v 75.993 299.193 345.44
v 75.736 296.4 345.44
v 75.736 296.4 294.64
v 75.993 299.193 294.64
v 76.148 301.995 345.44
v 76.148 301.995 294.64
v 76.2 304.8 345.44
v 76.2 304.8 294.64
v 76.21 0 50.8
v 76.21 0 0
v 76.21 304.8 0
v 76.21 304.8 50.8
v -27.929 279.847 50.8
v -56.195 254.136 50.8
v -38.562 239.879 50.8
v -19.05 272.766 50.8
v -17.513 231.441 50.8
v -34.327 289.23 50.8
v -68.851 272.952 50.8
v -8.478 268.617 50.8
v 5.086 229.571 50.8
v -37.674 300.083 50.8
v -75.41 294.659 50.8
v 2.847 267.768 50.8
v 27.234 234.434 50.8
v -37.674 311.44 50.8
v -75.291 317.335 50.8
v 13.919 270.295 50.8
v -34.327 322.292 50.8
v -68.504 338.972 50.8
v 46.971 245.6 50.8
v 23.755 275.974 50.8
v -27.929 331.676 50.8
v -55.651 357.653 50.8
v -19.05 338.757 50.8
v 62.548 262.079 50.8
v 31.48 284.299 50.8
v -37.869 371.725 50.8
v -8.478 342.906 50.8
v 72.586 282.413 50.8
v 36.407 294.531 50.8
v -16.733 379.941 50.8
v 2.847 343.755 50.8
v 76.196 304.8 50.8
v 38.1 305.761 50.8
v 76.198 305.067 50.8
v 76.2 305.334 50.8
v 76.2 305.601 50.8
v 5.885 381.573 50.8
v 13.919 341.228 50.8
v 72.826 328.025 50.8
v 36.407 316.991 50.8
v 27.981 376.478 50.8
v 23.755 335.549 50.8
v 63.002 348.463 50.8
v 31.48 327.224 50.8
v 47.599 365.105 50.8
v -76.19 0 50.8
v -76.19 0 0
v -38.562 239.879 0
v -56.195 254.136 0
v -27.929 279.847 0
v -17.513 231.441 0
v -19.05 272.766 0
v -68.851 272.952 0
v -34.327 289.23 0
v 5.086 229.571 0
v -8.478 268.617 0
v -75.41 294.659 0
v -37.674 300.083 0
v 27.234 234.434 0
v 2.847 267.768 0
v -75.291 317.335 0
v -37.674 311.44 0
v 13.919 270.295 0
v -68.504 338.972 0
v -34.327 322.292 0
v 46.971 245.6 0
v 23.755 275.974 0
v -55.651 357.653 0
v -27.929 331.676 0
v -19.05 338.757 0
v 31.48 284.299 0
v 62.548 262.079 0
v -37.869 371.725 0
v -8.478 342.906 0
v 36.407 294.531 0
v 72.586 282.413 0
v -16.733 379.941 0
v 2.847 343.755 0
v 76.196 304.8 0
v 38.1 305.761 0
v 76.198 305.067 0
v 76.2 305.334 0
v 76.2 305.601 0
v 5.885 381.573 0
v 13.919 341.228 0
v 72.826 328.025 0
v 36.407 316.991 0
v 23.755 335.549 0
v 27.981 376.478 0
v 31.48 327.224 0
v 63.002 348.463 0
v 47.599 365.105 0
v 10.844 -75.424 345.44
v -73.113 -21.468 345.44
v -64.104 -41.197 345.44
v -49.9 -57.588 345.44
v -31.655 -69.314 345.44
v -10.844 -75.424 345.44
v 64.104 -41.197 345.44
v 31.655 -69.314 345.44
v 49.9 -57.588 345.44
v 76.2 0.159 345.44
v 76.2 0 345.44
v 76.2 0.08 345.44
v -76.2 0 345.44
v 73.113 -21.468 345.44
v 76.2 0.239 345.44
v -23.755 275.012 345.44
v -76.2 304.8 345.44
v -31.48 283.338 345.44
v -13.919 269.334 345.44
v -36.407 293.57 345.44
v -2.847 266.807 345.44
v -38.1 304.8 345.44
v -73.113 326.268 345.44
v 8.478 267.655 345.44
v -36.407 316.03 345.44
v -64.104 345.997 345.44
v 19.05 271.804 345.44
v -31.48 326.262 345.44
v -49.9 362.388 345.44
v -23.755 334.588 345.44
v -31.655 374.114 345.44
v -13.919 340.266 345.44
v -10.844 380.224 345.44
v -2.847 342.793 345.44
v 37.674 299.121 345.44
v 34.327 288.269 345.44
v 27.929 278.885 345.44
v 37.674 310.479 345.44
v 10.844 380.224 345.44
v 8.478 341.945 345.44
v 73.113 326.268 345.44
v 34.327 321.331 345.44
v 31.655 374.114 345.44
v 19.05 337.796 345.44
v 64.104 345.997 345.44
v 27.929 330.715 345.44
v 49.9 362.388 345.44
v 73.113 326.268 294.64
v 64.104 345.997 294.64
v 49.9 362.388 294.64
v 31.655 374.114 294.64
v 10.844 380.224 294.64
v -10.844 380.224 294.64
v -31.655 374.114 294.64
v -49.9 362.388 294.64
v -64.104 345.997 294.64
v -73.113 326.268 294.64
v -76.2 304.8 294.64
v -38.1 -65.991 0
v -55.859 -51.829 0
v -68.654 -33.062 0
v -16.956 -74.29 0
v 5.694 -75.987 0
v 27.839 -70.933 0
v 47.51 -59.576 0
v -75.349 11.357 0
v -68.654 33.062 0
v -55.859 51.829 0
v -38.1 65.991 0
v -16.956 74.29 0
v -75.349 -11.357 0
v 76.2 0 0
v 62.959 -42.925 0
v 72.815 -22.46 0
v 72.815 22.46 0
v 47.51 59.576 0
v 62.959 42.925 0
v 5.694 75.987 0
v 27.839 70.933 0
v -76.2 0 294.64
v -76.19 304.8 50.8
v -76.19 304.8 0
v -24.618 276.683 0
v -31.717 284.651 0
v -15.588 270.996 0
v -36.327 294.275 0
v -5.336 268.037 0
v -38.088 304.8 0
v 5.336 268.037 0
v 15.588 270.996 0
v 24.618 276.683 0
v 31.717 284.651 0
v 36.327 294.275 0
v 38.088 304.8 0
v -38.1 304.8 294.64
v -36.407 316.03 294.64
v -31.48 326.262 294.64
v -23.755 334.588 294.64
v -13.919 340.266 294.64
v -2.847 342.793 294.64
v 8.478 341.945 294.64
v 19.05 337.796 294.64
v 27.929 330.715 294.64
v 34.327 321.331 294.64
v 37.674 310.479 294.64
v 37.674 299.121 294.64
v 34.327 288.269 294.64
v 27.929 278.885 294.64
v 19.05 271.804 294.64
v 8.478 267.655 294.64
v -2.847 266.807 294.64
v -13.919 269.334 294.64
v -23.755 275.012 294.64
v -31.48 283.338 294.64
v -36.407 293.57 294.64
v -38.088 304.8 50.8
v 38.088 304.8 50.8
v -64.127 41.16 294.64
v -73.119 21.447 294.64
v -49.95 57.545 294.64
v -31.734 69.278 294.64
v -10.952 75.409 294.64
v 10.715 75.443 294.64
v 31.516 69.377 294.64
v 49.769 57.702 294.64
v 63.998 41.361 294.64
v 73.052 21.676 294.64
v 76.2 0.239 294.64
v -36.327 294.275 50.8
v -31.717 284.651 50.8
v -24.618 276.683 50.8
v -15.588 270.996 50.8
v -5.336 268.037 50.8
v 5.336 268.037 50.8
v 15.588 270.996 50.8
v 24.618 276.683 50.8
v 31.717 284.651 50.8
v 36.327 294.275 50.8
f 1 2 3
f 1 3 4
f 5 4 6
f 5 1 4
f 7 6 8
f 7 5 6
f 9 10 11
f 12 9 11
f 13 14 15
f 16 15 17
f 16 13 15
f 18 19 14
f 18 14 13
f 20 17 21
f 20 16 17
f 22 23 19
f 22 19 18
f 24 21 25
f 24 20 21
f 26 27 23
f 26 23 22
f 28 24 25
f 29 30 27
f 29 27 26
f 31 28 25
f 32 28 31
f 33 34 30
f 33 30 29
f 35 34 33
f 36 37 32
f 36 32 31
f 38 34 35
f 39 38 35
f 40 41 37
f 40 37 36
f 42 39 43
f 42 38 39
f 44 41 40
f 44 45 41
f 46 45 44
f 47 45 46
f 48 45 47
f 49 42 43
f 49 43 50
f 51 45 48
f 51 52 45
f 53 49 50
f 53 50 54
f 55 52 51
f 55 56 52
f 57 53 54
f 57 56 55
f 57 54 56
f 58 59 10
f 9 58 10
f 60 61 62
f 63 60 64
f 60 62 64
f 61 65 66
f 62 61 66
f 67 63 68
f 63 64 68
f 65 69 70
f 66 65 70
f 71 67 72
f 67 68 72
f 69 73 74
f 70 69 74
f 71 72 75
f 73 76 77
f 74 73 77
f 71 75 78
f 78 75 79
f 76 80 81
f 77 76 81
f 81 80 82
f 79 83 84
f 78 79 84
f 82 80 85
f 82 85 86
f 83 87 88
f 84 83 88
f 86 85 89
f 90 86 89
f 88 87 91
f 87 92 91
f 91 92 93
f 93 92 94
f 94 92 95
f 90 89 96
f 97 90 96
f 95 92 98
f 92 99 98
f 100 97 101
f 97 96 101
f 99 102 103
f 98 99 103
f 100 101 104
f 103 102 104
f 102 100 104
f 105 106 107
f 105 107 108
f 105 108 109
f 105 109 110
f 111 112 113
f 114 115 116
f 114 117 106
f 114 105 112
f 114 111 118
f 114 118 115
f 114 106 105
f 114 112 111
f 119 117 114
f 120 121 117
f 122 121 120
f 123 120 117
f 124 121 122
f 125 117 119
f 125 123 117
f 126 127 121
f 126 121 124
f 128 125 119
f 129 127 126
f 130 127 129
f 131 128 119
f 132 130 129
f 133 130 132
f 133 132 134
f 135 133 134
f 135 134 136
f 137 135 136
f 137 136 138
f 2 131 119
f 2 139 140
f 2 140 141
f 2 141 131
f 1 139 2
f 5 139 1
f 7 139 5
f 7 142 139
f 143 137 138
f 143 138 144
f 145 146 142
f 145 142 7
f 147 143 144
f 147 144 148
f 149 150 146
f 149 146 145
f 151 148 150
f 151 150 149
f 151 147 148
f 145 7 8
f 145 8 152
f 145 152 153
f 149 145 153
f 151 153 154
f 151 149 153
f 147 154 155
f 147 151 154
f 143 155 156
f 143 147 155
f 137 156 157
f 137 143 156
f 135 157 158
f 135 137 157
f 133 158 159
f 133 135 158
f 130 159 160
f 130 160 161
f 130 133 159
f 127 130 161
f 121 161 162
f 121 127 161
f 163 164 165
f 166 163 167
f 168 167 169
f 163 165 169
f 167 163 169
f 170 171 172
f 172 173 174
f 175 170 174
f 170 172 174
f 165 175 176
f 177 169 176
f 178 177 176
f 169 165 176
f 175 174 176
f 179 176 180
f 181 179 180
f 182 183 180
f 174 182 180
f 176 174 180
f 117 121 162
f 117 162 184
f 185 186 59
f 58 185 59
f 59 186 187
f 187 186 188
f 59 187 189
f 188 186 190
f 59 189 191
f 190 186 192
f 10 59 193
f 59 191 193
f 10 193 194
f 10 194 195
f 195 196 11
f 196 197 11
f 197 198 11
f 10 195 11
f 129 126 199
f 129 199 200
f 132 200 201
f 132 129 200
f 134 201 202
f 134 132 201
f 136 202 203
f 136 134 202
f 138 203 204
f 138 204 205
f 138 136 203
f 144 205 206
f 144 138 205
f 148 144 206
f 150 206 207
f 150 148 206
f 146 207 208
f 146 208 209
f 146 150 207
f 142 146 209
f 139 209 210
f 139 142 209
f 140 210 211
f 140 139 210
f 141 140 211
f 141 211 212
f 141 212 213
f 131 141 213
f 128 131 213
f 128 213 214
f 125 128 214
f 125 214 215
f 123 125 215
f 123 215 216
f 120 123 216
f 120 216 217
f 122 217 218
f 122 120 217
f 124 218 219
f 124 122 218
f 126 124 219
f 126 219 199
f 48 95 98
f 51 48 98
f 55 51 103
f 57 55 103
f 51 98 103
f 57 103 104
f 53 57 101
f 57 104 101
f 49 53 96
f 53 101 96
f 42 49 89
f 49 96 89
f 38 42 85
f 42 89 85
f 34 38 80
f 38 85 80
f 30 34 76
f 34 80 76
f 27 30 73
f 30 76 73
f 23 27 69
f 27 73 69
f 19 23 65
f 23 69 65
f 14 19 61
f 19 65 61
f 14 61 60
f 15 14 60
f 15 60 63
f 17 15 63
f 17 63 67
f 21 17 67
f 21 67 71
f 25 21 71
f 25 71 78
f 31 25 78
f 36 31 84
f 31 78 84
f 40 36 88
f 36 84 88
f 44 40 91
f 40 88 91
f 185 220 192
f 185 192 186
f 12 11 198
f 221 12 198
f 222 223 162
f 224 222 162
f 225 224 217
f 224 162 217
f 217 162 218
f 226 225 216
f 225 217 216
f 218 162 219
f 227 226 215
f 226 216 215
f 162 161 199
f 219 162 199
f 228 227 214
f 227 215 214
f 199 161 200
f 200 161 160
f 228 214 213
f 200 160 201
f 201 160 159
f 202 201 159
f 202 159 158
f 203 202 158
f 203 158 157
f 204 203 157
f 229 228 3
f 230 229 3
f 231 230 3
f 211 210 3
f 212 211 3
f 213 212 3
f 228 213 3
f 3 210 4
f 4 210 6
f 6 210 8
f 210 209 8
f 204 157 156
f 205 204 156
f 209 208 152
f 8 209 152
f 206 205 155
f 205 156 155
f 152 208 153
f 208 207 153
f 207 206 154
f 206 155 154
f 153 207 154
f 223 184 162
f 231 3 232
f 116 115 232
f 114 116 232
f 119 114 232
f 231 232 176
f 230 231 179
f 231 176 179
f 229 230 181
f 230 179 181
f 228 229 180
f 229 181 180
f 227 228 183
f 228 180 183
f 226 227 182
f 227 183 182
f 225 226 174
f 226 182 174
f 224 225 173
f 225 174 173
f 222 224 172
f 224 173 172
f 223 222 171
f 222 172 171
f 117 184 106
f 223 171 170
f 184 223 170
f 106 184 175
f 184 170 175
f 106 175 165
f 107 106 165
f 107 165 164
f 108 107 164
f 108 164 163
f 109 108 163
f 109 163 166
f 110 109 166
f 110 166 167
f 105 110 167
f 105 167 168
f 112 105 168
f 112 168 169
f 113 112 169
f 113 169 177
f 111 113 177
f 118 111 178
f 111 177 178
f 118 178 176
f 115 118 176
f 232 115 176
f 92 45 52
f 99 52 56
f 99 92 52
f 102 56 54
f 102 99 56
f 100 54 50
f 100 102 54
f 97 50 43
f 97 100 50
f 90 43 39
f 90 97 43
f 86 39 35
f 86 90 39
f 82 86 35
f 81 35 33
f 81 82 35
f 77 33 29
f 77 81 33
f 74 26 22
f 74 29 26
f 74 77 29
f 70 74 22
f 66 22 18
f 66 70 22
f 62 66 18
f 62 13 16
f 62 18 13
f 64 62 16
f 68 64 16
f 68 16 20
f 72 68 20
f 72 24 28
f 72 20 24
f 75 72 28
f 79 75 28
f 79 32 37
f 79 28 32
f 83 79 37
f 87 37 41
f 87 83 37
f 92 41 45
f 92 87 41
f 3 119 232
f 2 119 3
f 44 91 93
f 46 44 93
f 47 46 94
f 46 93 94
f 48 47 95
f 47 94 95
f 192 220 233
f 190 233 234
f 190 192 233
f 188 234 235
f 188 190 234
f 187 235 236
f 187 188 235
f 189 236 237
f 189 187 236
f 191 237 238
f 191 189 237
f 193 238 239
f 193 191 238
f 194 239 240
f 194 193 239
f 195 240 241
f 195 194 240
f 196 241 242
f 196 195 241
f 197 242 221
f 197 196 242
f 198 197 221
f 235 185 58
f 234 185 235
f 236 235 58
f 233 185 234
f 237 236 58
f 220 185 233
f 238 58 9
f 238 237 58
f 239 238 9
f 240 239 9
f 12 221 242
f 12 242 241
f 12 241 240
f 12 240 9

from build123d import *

# Parameters (mm, degrees)
F0_R     = 76.2
F4_DEPTH = 345.44
F6_DEPTH = 50.8
F7_DEPTH = 50.8
F3_R     = 38.1
F8_DEPTH = 91.44


# Not quite as in the source:
# - ends of sketch curves that miss each other by under 0.0002 mm in the source are joined


with BuildPart() as f4:
    # F0 (on Top) → F4 (new body)
    with BuildSketch(Plane.XY):
        Circle(F0_R)
    extrude(amount=F4_DEPTH)

    # F5 (on face) → F6 (join)
    with BuildSketch(Plane.XY.offset(345.44)):
        with BuildLine():
            ThreePointArc((-76.2, 304.8), (-4.2065849822, 228.7161998663), (75.7355549288, 296.399659553))
            Line((75.7355549288, 296.399659553), (75.7223893169, 304.8))
            Line((75.7223893169, 304.8), (38.1, 304.8))
            ThreePointArc((38.1, 304.8), (0, 266.7), (-38.1, 304.8))
            Line((-38.1, 304.8), (-76.2, 304.8))
        make_face()
        with BuildLine():
            Line((75.7223893169, 304.8), (75.7355549288, 296.399659553))
            ThreePointArc((75.7355549288, 296.399659553), (76.0838001337, 300.5934150178), (76.2, 304.8))
            ThreePointArc((76.2, 304.8), (0, 381), (-76.2, 304.8))
            Line((-76.2, 304.8), (-38.1, 304.8))
            ThreePointArc((-38.1, 304.8), (0, 342.9), (38.1, 304.8))
            Line((38.1, 304.8), (75.7223893169, 304.8))
        make_face()
        with BuildLine():
            ThreePointArc((-76.2, 0), (0, 76.2), (76.2, 0))
            Line((76.2, 0), (75.7355549288, 296.399659553))
            ThreePointArc((75.7355549288, 296.399659553), (-4.2065849822, 228.7161998663), (-76.2, 304.8))
            Line((-76.2, 304.8), (-76.2, 0))
        make_face()
    extrude(amount=-F6_DEPTH)


with BuildPart() as f7:
    # F2 (on face) → F7 (new body)
    with BuildSketch(Plane.XY):
        with BuildLine():
            Line((-76.1898637822, 304.8), (-76.1898637822, 304.3581831019))
            ThreePointArc((-76.1898637822, 304.3581831019), (0.2209283182, 229.401345622), (76.1957896369, 304.8))
            Line((76.1957896369, 304.8), (-76.1898637822, 304.8))
        make_face()
        with BuildLine():
            ThreePointArc((76.1957896369, 304.8), (76.198947402, 305.2005071425), (76.2, 305.6010253502))
            ThreePointArc((76.2, 305.6010253502), (-0.6214417907, 381.7984912536), (-76.1898637822, 304.3581831019))
            Line((-76.1898637822, 304.3581831019), (-76.1898637822, 304.8))
            Line((-76.1898637822, 304.8), (76.1957896369, 304.8))
        make_face()
    extrude(amount=F7_DEPTH)


with BuildPart() as f7b:
    # F1 (on Top) → F7, piece 2 (new body)
    with BuildSketch(Plane.XY):
        Polygon((-76.1898637822, 0), (0, 0), (76.2101362178, 0), (76.2101362178, 304.8), (-76.1898637822, 304.8), align=None)
    extrude(amount=F7_DEPTH)


with BuildPart() as f8_tool:
    # F3 (on face) → F8 (new body)
    with BuildSketch(Plane.XY):
        with Locations((0, 305.761307478)):
            Circle(F3_R)
    extrude(amount=F8_DEPTH)


with BuildPart() as f7_1:
    add(f7.part)

    # F8: cut by f8_tool
    add(f8_tool.part, mode=Mode.SUBTRACT)


with BuildPart() as f7b_1:
    add(f7b.part)

    # F8: cut by f8_tool
    add(f8_tool.part, mode=Mode.SUBTRACT)


solid = Compound([f4.part, f7_1.part, f7b_1.part])
